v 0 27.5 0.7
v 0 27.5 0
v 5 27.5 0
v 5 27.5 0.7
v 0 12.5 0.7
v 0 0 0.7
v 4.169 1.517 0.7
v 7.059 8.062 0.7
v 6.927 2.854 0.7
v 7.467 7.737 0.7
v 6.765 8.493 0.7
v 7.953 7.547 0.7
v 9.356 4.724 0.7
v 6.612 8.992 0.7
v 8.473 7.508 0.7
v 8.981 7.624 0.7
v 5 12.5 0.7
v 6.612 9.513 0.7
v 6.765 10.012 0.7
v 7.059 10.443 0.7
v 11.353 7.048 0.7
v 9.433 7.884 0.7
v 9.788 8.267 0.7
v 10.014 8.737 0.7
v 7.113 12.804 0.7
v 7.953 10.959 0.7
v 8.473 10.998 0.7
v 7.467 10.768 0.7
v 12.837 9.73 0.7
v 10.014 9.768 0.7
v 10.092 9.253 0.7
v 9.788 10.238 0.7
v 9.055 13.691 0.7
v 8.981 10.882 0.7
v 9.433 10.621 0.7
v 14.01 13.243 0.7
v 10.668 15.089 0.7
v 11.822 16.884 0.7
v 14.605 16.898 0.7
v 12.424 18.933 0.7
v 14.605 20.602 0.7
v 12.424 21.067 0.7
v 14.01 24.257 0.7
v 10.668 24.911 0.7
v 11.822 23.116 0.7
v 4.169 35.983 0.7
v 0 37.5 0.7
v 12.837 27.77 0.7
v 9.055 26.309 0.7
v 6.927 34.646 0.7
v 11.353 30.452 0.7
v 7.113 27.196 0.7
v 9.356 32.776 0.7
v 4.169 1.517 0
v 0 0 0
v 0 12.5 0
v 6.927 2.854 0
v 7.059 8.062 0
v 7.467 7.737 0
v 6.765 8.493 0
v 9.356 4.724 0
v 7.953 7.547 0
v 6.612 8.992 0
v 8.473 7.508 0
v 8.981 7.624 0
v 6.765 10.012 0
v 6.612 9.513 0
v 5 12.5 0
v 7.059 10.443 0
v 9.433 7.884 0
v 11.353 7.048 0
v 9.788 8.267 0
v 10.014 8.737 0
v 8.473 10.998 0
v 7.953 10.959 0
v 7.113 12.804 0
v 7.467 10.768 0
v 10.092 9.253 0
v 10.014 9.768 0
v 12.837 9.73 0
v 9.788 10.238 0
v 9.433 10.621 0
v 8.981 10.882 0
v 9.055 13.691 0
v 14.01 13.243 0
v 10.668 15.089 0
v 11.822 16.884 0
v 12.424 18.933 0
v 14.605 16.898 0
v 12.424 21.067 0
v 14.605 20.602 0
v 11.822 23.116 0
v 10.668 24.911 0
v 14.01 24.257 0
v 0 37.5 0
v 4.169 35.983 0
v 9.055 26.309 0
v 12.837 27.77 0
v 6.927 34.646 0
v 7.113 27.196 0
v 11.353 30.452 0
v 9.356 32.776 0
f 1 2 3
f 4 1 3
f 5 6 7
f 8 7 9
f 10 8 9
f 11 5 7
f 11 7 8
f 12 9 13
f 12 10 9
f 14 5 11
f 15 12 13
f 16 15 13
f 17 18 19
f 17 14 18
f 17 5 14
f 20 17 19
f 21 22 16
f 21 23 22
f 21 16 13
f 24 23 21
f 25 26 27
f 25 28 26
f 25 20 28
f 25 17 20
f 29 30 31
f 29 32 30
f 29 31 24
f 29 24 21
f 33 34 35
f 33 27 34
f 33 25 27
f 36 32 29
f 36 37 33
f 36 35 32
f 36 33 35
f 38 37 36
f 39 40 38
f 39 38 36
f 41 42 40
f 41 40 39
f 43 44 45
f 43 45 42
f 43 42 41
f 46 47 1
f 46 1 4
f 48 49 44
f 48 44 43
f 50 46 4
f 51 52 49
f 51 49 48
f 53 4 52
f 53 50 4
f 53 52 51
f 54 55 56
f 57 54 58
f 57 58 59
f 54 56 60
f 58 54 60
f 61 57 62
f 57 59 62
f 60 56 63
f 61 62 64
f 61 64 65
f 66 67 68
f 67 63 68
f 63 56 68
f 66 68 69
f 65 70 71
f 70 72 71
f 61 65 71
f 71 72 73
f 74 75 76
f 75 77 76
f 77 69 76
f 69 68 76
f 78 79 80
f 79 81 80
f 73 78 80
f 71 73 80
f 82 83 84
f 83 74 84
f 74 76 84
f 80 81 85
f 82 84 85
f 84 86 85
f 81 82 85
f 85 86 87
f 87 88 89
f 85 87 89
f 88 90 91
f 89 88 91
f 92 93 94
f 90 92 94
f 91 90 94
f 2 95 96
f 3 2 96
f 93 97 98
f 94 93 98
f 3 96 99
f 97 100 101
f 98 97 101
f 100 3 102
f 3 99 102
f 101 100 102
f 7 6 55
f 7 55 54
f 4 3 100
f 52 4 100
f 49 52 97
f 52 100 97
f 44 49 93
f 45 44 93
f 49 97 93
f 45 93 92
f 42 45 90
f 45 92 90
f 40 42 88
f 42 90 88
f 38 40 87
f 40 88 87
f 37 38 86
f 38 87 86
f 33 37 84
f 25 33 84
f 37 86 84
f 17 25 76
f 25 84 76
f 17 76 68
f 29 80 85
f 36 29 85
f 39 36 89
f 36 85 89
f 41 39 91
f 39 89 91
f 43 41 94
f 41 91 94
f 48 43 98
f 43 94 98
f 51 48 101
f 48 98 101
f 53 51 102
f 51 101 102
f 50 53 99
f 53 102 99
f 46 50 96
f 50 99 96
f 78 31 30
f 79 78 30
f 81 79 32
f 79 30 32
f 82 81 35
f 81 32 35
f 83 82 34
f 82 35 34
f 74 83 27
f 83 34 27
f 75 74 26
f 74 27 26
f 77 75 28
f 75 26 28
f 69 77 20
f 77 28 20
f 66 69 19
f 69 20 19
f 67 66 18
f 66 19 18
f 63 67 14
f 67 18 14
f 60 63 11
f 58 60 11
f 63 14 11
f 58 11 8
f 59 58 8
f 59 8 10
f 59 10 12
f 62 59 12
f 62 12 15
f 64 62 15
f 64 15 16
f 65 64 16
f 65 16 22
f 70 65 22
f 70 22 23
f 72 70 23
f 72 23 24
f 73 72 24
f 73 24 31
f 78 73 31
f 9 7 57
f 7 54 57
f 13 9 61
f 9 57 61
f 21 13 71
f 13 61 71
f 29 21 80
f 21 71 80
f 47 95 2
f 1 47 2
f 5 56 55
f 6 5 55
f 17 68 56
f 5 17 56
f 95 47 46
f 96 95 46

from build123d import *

# Parameters (mm, degrees)
BOSS_EXTRUDE1_DEPTH = 0.7
SKETCH2_R           = 1.75
CUT_EXTRUDE1_DEPTH  = 10
FILLET1_R           = 15


with BuildPart() as part:
    # Sketch1 → Boss-Extrude1 (new body)
    with BuildSketch(Plane.XY):
        with BuildLine():
            Line((0, 0), (5, 0))
            ThreePointArc((5, 0), (14.679433195, 18.75), (5, 37.5))
            Line((5, 37.5), (0, 37.5))
            Line((0, 37.5), (0, 27.5))
            Line((0, 27.5), (5, 27.5))
            ThreePointArc((5, 27.5), (12.5, 20), (5, 12.5))
            Line((5, 12.5), (0, 12.5))
            Line((0, 12.5), (0, 0))
        make_face()
    extrude(amount=BOSS_EXTRUDE1_DEPTH)

    # Sketch2 → Cut-Extrude1 (cut)
    with BuildSketch(Plane.XY.offset(0.7)):
        with Locations((8.342000555, 9.25262746)):
            Circle(SKETCH2_R)
        Polygon((0, 37.5), (13.374942175, 32.631919163), (10.545086025, 37.5), align=None)
        Polygon((0, 0), (14.645857922, 5.330656339), (11.681927556, 0), align=None)
    extrude(amount=-CUT_EXTRUDE1_DEPTH, mode=Mode.SUBTRACT)

    # Fillet1
    fillet1_edges = [part.edges().sort_by_distance(p)[0] for p in [
        (8.542627357, 34.39073792, 0.35),
        (8.542627357, 3.10926208, 0.35),
    ]]
    fillet(fillet1_edges, radius=FILLET1_R)


solid = part.part
